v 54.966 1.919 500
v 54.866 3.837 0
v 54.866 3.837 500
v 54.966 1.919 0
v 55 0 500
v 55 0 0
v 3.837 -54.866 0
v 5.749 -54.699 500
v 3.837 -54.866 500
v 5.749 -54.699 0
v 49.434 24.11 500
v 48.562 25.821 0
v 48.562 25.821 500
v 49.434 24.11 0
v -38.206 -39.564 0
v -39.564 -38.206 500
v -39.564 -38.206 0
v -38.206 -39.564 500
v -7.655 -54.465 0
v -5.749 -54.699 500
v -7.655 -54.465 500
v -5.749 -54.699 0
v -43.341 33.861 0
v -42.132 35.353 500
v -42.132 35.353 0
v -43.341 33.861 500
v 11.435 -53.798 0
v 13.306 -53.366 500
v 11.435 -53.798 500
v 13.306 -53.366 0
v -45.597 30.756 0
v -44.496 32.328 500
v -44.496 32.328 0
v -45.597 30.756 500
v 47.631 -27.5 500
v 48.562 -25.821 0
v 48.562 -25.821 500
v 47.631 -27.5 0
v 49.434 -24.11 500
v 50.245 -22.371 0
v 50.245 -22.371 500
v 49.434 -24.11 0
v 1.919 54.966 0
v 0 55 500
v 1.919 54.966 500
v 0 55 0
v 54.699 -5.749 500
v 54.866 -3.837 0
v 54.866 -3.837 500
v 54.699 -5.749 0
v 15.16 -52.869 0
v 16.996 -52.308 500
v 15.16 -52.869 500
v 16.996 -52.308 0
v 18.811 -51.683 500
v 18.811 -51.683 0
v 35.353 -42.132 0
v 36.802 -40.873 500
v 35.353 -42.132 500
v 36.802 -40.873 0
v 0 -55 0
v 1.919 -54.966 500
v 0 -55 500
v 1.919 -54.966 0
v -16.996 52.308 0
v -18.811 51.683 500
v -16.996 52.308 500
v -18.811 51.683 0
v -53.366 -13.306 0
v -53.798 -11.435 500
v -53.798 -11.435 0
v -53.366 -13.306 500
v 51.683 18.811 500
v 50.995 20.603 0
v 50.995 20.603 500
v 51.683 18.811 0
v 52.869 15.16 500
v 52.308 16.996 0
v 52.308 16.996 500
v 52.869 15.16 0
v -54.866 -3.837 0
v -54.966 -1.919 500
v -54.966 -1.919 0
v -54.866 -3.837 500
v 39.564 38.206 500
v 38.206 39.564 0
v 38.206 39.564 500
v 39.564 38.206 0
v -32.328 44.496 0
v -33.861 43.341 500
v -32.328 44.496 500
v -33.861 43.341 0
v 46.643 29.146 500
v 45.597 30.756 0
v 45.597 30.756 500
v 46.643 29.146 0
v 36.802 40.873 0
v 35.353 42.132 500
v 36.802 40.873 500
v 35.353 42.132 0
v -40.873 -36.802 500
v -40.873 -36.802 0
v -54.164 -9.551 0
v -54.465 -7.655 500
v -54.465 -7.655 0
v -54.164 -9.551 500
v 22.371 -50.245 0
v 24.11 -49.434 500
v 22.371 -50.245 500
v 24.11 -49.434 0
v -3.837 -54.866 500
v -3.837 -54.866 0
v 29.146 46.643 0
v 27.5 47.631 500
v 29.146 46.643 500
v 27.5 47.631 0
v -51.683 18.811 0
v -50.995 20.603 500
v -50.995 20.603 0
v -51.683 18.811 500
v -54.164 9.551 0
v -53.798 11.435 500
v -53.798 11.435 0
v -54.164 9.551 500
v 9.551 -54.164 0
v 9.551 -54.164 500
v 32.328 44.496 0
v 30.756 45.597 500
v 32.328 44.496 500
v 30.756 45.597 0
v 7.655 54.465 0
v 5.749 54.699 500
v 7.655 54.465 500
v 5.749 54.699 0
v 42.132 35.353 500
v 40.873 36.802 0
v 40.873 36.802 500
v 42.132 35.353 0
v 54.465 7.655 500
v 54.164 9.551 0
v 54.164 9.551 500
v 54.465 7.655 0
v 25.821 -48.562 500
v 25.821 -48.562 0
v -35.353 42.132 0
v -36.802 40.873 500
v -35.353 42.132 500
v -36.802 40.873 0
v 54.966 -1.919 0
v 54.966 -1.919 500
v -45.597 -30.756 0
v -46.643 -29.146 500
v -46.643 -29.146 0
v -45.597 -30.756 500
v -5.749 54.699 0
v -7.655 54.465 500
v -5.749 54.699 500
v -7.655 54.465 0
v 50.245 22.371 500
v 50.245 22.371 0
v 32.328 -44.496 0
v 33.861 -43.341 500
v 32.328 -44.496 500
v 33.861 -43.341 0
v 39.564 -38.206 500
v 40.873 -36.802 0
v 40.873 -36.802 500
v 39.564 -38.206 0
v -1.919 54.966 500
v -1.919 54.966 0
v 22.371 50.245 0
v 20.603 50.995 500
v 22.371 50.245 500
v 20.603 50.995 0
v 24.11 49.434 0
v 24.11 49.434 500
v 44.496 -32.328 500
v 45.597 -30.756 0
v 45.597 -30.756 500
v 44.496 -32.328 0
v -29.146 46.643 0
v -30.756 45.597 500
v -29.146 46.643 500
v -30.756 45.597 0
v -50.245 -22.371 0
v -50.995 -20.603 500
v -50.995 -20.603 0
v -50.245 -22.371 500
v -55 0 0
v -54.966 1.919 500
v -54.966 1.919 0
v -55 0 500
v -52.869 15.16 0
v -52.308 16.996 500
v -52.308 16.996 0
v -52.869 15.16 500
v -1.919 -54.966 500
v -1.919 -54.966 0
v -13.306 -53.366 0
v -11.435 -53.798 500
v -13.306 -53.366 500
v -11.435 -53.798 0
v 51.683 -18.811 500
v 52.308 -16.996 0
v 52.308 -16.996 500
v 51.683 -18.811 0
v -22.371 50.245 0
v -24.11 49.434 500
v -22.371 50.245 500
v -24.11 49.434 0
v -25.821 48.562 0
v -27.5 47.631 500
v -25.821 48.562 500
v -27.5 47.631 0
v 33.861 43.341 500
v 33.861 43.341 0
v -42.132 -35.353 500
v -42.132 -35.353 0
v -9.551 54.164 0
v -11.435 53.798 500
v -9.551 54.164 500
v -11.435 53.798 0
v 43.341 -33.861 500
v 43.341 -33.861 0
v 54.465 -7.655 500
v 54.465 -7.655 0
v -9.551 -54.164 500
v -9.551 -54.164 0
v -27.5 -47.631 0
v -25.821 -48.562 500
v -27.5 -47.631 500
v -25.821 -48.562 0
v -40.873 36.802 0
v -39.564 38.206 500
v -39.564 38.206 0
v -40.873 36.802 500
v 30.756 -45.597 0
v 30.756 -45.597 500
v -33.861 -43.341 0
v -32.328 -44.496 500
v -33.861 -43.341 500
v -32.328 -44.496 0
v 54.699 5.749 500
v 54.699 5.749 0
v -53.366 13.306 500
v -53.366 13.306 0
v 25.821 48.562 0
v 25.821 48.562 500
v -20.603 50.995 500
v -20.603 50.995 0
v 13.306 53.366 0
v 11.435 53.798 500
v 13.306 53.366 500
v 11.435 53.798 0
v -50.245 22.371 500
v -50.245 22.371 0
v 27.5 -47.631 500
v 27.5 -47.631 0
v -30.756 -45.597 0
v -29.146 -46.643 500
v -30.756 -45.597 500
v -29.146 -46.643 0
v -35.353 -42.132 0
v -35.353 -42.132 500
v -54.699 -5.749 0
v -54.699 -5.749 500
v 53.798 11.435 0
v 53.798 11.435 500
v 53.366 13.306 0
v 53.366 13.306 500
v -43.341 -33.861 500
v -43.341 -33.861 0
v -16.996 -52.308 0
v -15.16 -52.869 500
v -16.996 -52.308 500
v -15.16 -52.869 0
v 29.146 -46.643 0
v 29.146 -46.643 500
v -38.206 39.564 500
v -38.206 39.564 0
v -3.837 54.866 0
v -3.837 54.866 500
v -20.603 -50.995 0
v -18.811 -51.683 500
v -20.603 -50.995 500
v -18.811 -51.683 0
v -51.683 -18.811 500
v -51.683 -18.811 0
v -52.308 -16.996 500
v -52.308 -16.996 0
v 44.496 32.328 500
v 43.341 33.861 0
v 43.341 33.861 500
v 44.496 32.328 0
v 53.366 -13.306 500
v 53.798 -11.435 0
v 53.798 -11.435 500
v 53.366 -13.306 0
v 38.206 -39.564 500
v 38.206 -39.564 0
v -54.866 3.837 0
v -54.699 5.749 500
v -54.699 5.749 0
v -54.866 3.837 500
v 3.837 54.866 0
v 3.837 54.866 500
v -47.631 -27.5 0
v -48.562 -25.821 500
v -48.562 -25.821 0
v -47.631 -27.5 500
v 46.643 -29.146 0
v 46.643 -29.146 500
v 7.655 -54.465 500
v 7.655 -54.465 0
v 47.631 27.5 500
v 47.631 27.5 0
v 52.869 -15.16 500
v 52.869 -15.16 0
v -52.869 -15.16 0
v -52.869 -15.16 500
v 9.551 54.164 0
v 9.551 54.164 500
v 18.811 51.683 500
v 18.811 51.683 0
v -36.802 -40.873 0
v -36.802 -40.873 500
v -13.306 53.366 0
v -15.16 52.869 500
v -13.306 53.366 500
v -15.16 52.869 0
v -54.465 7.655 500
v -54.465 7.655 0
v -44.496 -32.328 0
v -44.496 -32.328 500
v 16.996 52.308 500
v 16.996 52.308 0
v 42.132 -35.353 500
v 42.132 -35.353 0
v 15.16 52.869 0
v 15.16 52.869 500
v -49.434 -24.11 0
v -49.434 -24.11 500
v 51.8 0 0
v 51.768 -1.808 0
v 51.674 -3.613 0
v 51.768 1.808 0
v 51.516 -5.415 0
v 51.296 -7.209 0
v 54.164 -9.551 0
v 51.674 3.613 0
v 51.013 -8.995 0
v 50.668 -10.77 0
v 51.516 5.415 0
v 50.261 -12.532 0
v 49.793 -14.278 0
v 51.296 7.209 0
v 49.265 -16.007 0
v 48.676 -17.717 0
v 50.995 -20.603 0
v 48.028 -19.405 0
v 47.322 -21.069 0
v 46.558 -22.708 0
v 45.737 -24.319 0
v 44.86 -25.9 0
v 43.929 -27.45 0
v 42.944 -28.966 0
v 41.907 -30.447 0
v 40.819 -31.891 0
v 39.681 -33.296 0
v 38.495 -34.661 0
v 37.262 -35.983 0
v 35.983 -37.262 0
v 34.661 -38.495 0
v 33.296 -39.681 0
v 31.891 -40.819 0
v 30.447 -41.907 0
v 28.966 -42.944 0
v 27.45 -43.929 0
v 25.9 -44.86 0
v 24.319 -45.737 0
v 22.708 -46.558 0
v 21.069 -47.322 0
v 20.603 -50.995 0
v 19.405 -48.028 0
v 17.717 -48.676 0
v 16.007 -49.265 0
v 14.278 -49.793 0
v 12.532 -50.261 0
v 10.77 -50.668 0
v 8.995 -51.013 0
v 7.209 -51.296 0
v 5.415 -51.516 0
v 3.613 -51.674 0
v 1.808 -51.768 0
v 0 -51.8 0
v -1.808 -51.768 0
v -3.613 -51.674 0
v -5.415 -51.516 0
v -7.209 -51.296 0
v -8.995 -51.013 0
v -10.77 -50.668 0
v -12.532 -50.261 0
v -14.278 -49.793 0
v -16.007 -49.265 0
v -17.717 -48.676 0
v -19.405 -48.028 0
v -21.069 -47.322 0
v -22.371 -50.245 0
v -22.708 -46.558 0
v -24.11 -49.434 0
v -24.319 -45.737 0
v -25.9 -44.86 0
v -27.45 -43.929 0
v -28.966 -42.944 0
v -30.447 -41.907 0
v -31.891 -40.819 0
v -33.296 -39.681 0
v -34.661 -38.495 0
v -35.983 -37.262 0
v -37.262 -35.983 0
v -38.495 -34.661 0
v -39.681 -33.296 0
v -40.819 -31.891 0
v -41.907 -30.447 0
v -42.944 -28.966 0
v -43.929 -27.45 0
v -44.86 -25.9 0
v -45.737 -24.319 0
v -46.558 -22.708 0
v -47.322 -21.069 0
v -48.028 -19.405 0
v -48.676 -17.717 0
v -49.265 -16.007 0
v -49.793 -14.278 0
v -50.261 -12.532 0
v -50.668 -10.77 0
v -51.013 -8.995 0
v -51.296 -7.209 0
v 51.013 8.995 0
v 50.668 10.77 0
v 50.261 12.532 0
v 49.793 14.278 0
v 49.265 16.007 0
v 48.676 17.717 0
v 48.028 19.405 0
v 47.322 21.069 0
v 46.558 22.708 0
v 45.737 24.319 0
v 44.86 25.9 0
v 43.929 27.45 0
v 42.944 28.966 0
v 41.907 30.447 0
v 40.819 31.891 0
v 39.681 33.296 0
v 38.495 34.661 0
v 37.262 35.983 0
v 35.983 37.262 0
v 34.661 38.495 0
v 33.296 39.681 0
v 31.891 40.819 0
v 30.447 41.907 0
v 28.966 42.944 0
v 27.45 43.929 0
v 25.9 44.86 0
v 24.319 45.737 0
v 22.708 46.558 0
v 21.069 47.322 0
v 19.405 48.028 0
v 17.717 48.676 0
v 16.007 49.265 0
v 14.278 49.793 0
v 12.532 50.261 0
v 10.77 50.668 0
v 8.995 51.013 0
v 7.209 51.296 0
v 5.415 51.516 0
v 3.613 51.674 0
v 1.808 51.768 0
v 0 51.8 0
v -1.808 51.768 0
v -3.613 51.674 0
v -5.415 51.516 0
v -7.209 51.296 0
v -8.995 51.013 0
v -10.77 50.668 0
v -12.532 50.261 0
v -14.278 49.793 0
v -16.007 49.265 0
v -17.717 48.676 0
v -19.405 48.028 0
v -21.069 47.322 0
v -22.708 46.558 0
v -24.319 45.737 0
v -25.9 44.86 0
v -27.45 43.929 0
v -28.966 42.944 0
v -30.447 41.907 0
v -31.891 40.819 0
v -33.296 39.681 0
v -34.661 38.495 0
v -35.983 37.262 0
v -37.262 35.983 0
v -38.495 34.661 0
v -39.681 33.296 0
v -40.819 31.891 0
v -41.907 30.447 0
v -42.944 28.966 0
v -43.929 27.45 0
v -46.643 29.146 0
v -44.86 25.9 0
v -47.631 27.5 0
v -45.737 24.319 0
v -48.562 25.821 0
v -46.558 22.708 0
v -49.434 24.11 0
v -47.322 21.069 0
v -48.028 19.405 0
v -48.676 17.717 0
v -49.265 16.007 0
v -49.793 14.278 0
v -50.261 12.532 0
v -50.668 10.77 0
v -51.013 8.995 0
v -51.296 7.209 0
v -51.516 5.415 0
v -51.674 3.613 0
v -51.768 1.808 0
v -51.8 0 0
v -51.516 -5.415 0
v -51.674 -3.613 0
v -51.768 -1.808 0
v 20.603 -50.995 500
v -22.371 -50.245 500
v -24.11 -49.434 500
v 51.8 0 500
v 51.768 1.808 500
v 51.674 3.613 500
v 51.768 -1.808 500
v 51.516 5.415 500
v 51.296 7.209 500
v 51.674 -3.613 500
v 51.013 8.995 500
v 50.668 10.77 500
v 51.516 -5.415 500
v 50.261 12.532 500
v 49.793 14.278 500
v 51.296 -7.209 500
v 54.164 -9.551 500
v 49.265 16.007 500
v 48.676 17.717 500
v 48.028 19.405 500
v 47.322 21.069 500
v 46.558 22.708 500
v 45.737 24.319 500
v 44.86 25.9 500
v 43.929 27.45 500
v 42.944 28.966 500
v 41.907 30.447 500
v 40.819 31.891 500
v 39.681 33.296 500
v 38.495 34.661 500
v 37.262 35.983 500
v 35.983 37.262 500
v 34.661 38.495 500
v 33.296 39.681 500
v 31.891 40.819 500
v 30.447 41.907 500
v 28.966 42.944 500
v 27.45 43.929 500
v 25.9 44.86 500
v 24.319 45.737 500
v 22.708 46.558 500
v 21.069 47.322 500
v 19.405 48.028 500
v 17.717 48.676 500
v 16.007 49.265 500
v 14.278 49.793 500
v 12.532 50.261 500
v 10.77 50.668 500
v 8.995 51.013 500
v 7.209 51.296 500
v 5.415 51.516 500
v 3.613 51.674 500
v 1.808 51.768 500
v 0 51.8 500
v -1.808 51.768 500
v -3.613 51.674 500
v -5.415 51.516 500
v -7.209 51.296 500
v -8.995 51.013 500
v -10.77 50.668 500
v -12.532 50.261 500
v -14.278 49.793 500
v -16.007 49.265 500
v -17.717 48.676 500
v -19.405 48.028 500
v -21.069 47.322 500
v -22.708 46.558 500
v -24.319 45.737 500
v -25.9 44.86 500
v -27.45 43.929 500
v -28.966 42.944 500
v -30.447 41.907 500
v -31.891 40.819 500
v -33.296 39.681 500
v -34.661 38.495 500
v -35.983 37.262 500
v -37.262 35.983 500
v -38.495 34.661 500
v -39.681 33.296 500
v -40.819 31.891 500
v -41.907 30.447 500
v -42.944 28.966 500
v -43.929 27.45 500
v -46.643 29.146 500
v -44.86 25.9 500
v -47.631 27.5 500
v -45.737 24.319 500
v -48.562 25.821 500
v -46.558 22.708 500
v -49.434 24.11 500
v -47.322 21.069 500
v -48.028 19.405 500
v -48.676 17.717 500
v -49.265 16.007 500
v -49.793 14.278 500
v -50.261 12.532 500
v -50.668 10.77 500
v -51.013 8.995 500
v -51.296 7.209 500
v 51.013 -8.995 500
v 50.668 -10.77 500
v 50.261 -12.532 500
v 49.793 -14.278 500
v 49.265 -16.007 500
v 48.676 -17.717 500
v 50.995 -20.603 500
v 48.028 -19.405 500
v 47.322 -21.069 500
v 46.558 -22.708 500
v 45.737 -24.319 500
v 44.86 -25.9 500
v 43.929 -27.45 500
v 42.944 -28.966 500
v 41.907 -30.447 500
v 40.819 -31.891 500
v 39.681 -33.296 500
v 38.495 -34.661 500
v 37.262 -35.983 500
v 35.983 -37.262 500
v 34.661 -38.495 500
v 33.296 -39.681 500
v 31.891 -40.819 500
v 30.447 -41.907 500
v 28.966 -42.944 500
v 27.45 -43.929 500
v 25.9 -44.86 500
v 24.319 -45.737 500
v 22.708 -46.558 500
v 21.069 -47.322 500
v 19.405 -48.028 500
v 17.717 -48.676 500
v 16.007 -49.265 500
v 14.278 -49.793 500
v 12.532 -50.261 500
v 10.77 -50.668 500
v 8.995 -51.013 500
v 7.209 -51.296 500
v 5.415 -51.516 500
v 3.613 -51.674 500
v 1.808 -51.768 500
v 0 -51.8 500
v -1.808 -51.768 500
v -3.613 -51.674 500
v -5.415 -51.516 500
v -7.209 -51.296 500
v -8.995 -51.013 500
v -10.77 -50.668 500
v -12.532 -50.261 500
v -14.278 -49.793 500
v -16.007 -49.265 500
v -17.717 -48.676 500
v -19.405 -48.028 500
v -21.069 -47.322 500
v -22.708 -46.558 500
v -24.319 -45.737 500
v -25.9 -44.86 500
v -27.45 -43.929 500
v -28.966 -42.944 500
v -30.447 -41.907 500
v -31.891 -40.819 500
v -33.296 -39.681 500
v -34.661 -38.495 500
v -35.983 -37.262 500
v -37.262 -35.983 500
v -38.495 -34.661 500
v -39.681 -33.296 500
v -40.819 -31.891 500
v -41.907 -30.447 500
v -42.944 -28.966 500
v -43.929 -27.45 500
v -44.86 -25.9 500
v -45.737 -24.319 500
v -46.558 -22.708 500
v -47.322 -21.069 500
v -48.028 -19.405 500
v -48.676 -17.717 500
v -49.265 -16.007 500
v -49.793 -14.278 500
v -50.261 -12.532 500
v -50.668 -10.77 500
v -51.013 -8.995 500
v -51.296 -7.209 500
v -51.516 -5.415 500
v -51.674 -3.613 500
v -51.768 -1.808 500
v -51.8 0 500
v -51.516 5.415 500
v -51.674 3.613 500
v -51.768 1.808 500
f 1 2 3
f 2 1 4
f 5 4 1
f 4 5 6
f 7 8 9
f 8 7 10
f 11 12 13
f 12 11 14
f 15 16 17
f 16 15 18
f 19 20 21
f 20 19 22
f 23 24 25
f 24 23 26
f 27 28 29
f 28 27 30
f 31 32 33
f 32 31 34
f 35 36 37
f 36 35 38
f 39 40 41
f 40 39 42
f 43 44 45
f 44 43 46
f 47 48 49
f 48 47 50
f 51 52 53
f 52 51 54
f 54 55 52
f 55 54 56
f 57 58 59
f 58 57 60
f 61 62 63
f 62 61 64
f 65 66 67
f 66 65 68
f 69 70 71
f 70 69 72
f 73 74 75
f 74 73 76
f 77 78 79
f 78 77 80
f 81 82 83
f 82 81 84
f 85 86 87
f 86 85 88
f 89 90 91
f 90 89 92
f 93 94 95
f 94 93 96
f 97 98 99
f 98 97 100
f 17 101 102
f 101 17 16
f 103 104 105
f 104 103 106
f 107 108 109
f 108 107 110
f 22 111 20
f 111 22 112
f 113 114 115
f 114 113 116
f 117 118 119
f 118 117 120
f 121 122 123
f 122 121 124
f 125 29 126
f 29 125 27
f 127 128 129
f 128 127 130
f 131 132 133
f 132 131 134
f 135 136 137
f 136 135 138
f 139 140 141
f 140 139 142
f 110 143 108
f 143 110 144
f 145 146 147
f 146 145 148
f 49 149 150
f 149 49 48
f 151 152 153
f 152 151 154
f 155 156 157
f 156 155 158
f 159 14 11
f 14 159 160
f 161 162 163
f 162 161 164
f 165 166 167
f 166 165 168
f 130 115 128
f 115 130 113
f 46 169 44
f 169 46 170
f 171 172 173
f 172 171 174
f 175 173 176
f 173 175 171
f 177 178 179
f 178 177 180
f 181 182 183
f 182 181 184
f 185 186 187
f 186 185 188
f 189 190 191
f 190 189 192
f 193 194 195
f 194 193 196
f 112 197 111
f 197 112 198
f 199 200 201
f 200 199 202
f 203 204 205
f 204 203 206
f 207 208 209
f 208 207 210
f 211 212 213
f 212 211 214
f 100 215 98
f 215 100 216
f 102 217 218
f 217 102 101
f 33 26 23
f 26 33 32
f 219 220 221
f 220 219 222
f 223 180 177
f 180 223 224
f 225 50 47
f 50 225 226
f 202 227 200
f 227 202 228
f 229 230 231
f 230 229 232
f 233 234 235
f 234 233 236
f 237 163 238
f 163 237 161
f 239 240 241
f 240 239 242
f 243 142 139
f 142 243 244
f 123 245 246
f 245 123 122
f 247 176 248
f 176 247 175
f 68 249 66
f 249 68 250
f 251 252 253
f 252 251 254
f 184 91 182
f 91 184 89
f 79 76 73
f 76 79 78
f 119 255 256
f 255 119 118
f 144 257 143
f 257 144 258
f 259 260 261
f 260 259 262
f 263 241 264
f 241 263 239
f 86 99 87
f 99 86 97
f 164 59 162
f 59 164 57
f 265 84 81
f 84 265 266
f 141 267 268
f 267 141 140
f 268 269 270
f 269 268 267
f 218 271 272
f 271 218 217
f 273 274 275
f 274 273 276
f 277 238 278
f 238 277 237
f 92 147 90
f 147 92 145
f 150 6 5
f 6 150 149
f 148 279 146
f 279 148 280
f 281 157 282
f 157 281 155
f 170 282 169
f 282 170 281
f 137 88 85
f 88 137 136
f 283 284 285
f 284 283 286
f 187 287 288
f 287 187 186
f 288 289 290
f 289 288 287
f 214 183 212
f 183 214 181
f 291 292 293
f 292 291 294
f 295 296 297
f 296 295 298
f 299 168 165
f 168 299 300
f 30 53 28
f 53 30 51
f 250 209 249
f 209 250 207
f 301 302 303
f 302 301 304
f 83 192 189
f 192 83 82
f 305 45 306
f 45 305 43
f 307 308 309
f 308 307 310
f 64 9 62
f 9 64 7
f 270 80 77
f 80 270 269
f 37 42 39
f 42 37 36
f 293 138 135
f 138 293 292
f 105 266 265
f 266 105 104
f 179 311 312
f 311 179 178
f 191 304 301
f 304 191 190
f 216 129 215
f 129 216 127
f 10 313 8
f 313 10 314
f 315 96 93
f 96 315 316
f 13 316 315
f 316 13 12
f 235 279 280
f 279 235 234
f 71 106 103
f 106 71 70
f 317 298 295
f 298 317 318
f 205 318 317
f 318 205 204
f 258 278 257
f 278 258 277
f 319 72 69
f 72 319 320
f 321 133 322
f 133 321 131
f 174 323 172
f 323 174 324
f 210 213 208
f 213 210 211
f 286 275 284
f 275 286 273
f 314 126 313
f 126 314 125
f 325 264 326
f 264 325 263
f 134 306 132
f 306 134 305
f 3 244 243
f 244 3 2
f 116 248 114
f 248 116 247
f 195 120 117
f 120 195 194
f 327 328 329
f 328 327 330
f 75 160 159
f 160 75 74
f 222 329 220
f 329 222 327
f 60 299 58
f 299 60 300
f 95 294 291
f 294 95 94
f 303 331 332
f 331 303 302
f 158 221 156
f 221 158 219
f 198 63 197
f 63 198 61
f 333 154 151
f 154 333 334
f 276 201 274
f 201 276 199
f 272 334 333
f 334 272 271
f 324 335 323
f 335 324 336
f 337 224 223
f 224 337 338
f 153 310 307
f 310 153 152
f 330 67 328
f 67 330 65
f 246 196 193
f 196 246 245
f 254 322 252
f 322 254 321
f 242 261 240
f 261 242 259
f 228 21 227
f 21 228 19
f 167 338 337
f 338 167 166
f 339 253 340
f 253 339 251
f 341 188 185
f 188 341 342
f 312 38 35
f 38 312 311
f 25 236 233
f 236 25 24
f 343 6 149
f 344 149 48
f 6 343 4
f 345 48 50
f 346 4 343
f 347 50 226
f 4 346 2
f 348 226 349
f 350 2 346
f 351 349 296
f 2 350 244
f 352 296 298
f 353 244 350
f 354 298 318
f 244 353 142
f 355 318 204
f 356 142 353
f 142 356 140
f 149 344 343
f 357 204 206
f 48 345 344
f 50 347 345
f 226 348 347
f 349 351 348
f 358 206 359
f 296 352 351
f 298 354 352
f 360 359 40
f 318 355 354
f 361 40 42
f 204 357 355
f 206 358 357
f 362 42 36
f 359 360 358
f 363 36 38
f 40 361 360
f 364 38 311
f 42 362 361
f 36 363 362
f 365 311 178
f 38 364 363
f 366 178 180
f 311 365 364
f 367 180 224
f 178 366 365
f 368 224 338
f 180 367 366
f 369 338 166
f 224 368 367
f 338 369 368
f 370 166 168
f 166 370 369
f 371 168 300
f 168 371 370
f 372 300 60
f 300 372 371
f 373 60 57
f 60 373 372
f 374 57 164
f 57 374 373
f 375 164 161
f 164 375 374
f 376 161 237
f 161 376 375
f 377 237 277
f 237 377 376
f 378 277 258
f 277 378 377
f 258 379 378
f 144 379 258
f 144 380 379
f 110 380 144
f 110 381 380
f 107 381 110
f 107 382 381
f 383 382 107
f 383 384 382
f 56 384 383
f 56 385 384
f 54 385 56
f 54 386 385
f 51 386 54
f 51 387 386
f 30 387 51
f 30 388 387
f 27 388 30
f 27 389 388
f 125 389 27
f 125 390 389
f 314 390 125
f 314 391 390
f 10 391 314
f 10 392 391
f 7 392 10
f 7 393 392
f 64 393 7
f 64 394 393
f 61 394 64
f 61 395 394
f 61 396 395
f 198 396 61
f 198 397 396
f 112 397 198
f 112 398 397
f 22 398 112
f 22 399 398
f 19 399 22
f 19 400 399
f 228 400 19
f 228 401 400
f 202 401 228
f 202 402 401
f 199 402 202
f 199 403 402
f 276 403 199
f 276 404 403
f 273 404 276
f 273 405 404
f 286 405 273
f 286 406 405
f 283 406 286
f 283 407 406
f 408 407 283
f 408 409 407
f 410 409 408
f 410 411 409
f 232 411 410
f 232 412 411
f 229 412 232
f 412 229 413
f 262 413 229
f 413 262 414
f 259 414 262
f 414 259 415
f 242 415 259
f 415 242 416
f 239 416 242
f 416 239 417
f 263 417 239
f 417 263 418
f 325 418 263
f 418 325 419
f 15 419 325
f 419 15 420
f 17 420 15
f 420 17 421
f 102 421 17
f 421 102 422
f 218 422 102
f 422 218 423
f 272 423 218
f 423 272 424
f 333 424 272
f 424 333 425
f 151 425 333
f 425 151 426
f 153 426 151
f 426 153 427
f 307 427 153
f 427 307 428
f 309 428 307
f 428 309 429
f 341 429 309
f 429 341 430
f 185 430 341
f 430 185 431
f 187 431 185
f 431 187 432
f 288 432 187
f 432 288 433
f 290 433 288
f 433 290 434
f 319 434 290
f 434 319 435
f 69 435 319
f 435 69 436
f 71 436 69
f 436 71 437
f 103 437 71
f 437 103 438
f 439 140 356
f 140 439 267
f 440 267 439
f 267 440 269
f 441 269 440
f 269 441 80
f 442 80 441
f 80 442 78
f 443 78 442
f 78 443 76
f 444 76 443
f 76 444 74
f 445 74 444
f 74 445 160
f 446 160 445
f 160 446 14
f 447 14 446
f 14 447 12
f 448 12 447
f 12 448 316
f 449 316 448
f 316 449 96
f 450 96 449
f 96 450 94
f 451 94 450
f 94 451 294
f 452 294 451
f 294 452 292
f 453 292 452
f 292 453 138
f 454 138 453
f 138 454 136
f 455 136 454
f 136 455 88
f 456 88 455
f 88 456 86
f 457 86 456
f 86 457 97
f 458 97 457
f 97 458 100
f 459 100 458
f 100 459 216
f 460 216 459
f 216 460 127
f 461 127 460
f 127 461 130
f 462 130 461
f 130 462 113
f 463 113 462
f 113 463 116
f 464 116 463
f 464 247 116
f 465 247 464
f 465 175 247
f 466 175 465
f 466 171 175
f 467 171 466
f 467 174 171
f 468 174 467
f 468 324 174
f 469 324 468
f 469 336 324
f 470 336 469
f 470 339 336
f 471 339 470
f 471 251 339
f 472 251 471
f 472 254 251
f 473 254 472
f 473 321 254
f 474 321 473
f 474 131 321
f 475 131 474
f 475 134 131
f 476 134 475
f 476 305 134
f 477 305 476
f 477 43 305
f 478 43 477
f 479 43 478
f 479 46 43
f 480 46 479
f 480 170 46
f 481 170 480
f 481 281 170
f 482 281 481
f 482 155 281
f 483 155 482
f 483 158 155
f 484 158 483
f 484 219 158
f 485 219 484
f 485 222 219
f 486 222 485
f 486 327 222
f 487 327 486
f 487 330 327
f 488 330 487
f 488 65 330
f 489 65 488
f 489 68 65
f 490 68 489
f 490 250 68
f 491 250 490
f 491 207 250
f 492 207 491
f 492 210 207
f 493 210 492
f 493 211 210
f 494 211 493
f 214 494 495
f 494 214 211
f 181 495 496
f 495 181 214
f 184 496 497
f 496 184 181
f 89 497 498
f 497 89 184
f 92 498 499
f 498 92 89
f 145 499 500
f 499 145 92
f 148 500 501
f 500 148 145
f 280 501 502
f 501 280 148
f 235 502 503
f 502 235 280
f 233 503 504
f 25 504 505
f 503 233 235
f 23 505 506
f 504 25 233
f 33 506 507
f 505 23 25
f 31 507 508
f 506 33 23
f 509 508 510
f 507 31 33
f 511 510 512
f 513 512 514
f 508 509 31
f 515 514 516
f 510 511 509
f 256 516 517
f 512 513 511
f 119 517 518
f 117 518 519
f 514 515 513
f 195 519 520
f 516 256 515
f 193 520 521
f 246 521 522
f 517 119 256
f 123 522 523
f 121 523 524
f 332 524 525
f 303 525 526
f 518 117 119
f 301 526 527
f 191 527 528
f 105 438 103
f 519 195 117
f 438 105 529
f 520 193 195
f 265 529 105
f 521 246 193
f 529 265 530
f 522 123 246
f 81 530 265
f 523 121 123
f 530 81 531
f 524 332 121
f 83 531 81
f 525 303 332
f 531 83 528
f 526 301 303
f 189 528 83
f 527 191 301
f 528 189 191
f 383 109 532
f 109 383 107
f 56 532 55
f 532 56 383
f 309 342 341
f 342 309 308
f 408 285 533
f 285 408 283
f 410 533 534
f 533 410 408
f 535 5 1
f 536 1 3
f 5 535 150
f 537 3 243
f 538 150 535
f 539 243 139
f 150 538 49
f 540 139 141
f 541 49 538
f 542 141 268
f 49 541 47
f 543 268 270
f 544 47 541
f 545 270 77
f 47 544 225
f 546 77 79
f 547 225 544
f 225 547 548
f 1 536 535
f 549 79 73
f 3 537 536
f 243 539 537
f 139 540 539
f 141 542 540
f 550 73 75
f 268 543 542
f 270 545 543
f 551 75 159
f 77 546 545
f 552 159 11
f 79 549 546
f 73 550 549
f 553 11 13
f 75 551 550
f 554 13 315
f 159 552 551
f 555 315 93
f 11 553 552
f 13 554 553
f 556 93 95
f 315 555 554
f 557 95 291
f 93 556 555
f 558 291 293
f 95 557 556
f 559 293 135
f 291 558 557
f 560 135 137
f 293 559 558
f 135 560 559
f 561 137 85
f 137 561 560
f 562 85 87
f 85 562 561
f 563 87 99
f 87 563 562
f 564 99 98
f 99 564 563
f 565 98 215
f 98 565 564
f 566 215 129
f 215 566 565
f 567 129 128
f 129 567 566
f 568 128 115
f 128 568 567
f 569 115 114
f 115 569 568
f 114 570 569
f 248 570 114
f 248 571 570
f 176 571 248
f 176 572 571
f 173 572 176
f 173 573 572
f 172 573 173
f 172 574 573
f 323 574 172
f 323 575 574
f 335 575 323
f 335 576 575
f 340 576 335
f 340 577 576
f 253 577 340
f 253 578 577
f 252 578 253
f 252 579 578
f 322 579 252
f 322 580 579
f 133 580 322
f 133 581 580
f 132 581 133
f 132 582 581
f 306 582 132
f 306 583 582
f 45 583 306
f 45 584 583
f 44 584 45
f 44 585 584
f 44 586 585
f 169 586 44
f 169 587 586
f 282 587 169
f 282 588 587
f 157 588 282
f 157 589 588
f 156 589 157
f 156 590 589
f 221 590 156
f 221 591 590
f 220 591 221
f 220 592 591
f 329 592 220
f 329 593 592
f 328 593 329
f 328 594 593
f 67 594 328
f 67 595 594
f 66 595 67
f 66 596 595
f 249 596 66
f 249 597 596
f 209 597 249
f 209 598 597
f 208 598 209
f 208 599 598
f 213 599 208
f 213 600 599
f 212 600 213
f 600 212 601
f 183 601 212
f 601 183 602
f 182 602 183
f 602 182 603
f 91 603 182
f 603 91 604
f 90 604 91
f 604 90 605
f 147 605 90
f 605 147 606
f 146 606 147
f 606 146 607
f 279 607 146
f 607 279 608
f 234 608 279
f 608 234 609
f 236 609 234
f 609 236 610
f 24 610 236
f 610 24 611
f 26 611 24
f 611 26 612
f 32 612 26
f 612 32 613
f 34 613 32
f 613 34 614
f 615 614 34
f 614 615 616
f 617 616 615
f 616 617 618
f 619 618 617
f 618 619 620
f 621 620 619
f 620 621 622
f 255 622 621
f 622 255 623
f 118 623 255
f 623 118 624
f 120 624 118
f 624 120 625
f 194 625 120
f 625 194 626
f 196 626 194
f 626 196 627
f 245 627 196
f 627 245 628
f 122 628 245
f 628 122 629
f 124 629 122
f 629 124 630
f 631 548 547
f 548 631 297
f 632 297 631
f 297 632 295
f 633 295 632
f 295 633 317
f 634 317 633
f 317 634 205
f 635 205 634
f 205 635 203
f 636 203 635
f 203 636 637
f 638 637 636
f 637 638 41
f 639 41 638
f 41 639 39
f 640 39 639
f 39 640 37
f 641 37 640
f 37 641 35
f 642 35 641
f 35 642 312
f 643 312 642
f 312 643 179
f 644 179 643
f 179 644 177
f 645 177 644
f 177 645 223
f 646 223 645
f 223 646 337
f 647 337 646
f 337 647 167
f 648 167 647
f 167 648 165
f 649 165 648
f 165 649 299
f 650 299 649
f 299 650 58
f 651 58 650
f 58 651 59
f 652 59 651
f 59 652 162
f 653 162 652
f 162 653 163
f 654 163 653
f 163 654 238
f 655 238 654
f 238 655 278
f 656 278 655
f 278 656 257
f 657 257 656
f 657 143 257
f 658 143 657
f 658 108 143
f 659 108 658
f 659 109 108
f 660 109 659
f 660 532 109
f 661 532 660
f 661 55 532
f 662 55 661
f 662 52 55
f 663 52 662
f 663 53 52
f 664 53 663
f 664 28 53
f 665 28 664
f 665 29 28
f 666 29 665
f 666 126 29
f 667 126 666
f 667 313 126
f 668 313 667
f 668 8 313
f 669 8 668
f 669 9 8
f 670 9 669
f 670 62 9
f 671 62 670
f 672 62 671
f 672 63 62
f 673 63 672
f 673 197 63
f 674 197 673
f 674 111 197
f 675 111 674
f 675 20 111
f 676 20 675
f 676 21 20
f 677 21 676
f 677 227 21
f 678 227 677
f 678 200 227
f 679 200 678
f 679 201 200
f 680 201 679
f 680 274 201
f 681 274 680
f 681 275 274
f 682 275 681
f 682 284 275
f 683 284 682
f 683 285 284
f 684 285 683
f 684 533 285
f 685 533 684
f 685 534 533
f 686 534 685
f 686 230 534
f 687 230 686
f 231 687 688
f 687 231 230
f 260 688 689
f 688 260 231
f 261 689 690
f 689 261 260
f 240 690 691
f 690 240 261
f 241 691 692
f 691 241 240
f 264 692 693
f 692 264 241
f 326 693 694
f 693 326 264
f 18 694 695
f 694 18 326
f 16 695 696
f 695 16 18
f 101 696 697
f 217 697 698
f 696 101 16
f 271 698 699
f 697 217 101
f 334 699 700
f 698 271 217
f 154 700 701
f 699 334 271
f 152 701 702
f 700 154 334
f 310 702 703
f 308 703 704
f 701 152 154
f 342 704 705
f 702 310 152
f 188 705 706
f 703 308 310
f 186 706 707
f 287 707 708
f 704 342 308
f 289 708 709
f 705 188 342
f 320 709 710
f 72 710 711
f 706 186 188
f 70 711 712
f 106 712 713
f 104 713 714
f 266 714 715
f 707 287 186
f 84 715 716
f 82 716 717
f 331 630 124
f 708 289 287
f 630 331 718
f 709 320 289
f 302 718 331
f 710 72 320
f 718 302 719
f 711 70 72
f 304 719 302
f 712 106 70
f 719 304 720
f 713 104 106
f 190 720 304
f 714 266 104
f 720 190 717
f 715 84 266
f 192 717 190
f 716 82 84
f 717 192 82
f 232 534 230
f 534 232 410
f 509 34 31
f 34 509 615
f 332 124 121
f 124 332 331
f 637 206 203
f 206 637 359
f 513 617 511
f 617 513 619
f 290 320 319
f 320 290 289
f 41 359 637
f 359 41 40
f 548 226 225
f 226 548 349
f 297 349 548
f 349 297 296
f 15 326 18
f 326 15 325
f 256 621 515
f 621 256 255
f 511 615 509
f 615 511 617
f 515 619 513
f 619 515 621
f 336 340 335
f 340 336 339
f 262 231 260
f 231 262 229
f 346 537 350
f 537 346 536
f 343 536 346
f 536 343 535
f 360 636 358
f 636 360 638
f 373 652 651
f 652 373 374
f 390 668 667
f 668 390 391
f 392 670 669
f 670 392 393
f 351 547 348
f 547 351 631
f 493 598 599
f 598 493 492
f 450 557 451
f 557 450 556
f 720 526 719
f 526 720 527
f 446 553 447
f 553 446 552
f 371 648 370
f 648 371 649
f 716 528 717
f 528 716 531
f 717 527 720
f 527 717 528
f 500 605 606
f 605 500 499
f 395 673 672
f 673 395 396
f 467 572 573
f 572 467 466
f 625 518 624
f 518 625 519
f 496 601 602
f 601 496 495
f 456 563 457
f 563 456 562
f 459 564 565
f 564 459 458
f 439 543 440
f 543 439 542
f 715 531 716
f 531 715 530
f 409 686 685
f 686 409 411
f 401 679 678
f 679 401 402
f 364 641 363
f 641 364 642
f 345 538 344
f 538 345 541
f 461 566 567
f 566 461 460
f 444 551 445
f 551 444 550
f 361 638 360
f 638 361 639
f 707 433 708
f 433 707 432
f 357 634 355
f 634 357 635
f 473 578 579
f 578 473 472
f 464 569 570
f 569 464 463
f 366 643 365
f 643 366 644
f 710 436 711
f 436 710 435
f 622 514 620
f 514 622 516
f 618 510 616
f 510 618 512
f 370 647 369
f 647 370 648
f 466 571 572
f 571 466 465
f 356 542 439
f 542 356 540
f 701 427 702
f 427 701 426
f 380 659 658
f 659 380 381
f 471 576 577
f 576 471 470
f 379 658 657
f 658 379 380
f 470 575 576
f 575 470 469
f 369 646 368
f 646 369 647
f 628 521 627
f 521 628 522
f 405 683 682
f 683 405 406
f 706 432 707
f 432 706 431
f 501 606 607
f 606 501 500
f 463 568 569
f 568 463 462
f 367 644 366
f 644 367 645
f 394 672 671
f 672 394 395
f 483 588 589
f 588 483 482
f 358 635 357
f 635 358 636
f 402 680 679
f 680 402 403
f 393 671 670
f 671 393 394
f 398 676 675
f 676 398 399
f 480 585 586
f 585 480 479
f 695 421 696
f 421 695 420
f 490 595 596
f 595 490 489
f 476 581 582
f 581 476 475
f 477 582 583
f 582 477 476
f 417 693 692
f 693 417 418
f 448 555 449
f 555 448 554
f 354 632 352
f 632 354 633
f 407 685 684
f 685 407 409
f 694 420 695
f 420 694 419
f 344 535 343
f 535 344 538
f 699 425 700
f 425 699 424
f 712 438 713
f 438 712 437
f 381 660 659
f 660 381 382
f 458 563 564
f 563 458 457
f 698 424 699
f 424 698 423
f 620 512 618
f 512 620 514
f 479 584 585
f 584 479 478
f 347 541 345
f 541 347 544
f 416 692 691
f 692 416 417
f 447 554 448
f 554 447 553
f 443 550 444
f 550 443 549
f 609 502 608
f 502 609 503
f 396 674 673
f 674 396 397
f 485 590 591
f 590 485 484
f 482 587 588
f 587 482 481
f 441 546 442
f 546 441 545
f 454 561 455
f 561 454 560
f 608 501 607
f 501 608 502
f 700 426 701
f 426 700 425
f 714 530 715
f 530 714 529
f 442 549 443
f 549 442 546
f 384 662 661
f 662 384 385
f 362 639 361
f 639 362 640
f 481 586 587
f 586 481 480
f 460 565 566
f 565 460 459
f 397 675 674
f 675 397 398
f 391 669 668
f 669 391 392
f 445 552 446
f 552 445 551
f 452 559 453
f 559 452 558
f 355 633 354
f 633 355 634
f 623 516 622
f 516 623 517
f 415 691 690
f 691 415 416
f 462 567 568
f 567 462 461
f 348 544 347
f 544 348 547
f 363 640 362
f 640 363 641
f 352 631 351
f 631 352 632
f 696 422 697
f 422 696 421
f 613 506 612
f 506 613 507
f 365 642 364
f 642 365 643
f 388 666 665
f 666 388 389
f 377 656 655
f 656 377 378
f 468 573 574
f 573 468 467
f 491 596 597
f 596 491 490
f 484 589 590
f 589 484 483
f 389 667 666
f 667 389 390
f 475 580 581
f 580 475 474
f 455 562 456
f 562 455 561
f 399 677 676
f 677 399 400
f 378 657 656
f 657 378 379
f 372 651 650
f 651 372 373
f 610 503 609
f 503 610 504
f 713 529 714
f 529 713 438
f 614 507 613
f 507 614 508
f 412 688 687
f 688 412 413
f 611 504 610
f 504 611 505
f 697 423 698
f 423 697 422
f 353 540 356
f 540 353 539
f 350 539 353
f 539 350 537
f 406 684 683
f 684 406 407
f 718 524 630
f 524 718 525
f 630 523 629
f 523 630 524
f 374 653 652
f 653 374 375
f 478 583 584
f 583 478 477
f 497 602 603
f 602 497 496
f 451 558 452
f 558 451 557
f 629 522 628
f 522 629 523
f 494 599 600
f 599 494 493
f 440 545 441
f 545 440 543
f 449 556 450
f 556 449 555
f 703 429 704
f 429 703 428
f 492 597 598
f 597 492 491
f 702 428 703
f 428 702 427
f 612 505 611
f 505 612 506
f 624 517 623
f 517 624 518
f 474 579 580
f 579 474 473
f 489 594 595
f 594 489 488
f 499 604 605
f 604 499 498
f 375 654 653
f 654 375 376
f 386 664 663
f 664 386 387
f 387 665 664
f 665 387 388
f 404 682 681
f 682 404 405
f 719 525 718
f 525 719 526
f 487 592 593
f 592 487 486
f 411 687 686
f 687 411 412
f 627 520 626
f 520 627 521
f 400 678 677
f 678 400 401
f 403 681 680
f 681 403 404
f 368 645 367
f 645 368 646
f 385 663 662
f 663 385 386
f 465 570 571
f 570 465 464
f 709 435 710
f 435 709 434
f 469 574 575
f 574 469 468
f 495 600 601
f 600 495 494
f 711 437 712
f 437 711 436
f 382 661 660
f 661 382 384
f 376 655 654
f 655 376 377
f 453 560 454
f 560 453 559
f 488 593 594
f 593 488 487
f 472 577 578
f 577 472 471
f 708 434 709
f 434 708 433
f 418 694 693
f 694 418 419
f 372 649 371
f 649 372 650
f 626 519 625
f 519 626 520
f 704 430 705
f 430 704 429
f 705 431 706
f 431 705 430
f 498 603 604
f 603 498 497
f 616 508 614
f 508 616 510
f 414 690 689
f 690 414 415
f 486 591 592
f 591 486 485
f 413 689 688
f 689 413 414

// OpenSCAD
$fn = 180;

// HT 110 pipe (approx.): OD 110 mm, wall 3.2 mm, length 500 mm
od = 110;
wall = 3.2;
id = od - 2*wall;
len = 500;

difference() {
  cylinder(h = len, d = od);
  translate([0,0,-0.1]) cylinder(h = len + 0.2, d = id);
}
